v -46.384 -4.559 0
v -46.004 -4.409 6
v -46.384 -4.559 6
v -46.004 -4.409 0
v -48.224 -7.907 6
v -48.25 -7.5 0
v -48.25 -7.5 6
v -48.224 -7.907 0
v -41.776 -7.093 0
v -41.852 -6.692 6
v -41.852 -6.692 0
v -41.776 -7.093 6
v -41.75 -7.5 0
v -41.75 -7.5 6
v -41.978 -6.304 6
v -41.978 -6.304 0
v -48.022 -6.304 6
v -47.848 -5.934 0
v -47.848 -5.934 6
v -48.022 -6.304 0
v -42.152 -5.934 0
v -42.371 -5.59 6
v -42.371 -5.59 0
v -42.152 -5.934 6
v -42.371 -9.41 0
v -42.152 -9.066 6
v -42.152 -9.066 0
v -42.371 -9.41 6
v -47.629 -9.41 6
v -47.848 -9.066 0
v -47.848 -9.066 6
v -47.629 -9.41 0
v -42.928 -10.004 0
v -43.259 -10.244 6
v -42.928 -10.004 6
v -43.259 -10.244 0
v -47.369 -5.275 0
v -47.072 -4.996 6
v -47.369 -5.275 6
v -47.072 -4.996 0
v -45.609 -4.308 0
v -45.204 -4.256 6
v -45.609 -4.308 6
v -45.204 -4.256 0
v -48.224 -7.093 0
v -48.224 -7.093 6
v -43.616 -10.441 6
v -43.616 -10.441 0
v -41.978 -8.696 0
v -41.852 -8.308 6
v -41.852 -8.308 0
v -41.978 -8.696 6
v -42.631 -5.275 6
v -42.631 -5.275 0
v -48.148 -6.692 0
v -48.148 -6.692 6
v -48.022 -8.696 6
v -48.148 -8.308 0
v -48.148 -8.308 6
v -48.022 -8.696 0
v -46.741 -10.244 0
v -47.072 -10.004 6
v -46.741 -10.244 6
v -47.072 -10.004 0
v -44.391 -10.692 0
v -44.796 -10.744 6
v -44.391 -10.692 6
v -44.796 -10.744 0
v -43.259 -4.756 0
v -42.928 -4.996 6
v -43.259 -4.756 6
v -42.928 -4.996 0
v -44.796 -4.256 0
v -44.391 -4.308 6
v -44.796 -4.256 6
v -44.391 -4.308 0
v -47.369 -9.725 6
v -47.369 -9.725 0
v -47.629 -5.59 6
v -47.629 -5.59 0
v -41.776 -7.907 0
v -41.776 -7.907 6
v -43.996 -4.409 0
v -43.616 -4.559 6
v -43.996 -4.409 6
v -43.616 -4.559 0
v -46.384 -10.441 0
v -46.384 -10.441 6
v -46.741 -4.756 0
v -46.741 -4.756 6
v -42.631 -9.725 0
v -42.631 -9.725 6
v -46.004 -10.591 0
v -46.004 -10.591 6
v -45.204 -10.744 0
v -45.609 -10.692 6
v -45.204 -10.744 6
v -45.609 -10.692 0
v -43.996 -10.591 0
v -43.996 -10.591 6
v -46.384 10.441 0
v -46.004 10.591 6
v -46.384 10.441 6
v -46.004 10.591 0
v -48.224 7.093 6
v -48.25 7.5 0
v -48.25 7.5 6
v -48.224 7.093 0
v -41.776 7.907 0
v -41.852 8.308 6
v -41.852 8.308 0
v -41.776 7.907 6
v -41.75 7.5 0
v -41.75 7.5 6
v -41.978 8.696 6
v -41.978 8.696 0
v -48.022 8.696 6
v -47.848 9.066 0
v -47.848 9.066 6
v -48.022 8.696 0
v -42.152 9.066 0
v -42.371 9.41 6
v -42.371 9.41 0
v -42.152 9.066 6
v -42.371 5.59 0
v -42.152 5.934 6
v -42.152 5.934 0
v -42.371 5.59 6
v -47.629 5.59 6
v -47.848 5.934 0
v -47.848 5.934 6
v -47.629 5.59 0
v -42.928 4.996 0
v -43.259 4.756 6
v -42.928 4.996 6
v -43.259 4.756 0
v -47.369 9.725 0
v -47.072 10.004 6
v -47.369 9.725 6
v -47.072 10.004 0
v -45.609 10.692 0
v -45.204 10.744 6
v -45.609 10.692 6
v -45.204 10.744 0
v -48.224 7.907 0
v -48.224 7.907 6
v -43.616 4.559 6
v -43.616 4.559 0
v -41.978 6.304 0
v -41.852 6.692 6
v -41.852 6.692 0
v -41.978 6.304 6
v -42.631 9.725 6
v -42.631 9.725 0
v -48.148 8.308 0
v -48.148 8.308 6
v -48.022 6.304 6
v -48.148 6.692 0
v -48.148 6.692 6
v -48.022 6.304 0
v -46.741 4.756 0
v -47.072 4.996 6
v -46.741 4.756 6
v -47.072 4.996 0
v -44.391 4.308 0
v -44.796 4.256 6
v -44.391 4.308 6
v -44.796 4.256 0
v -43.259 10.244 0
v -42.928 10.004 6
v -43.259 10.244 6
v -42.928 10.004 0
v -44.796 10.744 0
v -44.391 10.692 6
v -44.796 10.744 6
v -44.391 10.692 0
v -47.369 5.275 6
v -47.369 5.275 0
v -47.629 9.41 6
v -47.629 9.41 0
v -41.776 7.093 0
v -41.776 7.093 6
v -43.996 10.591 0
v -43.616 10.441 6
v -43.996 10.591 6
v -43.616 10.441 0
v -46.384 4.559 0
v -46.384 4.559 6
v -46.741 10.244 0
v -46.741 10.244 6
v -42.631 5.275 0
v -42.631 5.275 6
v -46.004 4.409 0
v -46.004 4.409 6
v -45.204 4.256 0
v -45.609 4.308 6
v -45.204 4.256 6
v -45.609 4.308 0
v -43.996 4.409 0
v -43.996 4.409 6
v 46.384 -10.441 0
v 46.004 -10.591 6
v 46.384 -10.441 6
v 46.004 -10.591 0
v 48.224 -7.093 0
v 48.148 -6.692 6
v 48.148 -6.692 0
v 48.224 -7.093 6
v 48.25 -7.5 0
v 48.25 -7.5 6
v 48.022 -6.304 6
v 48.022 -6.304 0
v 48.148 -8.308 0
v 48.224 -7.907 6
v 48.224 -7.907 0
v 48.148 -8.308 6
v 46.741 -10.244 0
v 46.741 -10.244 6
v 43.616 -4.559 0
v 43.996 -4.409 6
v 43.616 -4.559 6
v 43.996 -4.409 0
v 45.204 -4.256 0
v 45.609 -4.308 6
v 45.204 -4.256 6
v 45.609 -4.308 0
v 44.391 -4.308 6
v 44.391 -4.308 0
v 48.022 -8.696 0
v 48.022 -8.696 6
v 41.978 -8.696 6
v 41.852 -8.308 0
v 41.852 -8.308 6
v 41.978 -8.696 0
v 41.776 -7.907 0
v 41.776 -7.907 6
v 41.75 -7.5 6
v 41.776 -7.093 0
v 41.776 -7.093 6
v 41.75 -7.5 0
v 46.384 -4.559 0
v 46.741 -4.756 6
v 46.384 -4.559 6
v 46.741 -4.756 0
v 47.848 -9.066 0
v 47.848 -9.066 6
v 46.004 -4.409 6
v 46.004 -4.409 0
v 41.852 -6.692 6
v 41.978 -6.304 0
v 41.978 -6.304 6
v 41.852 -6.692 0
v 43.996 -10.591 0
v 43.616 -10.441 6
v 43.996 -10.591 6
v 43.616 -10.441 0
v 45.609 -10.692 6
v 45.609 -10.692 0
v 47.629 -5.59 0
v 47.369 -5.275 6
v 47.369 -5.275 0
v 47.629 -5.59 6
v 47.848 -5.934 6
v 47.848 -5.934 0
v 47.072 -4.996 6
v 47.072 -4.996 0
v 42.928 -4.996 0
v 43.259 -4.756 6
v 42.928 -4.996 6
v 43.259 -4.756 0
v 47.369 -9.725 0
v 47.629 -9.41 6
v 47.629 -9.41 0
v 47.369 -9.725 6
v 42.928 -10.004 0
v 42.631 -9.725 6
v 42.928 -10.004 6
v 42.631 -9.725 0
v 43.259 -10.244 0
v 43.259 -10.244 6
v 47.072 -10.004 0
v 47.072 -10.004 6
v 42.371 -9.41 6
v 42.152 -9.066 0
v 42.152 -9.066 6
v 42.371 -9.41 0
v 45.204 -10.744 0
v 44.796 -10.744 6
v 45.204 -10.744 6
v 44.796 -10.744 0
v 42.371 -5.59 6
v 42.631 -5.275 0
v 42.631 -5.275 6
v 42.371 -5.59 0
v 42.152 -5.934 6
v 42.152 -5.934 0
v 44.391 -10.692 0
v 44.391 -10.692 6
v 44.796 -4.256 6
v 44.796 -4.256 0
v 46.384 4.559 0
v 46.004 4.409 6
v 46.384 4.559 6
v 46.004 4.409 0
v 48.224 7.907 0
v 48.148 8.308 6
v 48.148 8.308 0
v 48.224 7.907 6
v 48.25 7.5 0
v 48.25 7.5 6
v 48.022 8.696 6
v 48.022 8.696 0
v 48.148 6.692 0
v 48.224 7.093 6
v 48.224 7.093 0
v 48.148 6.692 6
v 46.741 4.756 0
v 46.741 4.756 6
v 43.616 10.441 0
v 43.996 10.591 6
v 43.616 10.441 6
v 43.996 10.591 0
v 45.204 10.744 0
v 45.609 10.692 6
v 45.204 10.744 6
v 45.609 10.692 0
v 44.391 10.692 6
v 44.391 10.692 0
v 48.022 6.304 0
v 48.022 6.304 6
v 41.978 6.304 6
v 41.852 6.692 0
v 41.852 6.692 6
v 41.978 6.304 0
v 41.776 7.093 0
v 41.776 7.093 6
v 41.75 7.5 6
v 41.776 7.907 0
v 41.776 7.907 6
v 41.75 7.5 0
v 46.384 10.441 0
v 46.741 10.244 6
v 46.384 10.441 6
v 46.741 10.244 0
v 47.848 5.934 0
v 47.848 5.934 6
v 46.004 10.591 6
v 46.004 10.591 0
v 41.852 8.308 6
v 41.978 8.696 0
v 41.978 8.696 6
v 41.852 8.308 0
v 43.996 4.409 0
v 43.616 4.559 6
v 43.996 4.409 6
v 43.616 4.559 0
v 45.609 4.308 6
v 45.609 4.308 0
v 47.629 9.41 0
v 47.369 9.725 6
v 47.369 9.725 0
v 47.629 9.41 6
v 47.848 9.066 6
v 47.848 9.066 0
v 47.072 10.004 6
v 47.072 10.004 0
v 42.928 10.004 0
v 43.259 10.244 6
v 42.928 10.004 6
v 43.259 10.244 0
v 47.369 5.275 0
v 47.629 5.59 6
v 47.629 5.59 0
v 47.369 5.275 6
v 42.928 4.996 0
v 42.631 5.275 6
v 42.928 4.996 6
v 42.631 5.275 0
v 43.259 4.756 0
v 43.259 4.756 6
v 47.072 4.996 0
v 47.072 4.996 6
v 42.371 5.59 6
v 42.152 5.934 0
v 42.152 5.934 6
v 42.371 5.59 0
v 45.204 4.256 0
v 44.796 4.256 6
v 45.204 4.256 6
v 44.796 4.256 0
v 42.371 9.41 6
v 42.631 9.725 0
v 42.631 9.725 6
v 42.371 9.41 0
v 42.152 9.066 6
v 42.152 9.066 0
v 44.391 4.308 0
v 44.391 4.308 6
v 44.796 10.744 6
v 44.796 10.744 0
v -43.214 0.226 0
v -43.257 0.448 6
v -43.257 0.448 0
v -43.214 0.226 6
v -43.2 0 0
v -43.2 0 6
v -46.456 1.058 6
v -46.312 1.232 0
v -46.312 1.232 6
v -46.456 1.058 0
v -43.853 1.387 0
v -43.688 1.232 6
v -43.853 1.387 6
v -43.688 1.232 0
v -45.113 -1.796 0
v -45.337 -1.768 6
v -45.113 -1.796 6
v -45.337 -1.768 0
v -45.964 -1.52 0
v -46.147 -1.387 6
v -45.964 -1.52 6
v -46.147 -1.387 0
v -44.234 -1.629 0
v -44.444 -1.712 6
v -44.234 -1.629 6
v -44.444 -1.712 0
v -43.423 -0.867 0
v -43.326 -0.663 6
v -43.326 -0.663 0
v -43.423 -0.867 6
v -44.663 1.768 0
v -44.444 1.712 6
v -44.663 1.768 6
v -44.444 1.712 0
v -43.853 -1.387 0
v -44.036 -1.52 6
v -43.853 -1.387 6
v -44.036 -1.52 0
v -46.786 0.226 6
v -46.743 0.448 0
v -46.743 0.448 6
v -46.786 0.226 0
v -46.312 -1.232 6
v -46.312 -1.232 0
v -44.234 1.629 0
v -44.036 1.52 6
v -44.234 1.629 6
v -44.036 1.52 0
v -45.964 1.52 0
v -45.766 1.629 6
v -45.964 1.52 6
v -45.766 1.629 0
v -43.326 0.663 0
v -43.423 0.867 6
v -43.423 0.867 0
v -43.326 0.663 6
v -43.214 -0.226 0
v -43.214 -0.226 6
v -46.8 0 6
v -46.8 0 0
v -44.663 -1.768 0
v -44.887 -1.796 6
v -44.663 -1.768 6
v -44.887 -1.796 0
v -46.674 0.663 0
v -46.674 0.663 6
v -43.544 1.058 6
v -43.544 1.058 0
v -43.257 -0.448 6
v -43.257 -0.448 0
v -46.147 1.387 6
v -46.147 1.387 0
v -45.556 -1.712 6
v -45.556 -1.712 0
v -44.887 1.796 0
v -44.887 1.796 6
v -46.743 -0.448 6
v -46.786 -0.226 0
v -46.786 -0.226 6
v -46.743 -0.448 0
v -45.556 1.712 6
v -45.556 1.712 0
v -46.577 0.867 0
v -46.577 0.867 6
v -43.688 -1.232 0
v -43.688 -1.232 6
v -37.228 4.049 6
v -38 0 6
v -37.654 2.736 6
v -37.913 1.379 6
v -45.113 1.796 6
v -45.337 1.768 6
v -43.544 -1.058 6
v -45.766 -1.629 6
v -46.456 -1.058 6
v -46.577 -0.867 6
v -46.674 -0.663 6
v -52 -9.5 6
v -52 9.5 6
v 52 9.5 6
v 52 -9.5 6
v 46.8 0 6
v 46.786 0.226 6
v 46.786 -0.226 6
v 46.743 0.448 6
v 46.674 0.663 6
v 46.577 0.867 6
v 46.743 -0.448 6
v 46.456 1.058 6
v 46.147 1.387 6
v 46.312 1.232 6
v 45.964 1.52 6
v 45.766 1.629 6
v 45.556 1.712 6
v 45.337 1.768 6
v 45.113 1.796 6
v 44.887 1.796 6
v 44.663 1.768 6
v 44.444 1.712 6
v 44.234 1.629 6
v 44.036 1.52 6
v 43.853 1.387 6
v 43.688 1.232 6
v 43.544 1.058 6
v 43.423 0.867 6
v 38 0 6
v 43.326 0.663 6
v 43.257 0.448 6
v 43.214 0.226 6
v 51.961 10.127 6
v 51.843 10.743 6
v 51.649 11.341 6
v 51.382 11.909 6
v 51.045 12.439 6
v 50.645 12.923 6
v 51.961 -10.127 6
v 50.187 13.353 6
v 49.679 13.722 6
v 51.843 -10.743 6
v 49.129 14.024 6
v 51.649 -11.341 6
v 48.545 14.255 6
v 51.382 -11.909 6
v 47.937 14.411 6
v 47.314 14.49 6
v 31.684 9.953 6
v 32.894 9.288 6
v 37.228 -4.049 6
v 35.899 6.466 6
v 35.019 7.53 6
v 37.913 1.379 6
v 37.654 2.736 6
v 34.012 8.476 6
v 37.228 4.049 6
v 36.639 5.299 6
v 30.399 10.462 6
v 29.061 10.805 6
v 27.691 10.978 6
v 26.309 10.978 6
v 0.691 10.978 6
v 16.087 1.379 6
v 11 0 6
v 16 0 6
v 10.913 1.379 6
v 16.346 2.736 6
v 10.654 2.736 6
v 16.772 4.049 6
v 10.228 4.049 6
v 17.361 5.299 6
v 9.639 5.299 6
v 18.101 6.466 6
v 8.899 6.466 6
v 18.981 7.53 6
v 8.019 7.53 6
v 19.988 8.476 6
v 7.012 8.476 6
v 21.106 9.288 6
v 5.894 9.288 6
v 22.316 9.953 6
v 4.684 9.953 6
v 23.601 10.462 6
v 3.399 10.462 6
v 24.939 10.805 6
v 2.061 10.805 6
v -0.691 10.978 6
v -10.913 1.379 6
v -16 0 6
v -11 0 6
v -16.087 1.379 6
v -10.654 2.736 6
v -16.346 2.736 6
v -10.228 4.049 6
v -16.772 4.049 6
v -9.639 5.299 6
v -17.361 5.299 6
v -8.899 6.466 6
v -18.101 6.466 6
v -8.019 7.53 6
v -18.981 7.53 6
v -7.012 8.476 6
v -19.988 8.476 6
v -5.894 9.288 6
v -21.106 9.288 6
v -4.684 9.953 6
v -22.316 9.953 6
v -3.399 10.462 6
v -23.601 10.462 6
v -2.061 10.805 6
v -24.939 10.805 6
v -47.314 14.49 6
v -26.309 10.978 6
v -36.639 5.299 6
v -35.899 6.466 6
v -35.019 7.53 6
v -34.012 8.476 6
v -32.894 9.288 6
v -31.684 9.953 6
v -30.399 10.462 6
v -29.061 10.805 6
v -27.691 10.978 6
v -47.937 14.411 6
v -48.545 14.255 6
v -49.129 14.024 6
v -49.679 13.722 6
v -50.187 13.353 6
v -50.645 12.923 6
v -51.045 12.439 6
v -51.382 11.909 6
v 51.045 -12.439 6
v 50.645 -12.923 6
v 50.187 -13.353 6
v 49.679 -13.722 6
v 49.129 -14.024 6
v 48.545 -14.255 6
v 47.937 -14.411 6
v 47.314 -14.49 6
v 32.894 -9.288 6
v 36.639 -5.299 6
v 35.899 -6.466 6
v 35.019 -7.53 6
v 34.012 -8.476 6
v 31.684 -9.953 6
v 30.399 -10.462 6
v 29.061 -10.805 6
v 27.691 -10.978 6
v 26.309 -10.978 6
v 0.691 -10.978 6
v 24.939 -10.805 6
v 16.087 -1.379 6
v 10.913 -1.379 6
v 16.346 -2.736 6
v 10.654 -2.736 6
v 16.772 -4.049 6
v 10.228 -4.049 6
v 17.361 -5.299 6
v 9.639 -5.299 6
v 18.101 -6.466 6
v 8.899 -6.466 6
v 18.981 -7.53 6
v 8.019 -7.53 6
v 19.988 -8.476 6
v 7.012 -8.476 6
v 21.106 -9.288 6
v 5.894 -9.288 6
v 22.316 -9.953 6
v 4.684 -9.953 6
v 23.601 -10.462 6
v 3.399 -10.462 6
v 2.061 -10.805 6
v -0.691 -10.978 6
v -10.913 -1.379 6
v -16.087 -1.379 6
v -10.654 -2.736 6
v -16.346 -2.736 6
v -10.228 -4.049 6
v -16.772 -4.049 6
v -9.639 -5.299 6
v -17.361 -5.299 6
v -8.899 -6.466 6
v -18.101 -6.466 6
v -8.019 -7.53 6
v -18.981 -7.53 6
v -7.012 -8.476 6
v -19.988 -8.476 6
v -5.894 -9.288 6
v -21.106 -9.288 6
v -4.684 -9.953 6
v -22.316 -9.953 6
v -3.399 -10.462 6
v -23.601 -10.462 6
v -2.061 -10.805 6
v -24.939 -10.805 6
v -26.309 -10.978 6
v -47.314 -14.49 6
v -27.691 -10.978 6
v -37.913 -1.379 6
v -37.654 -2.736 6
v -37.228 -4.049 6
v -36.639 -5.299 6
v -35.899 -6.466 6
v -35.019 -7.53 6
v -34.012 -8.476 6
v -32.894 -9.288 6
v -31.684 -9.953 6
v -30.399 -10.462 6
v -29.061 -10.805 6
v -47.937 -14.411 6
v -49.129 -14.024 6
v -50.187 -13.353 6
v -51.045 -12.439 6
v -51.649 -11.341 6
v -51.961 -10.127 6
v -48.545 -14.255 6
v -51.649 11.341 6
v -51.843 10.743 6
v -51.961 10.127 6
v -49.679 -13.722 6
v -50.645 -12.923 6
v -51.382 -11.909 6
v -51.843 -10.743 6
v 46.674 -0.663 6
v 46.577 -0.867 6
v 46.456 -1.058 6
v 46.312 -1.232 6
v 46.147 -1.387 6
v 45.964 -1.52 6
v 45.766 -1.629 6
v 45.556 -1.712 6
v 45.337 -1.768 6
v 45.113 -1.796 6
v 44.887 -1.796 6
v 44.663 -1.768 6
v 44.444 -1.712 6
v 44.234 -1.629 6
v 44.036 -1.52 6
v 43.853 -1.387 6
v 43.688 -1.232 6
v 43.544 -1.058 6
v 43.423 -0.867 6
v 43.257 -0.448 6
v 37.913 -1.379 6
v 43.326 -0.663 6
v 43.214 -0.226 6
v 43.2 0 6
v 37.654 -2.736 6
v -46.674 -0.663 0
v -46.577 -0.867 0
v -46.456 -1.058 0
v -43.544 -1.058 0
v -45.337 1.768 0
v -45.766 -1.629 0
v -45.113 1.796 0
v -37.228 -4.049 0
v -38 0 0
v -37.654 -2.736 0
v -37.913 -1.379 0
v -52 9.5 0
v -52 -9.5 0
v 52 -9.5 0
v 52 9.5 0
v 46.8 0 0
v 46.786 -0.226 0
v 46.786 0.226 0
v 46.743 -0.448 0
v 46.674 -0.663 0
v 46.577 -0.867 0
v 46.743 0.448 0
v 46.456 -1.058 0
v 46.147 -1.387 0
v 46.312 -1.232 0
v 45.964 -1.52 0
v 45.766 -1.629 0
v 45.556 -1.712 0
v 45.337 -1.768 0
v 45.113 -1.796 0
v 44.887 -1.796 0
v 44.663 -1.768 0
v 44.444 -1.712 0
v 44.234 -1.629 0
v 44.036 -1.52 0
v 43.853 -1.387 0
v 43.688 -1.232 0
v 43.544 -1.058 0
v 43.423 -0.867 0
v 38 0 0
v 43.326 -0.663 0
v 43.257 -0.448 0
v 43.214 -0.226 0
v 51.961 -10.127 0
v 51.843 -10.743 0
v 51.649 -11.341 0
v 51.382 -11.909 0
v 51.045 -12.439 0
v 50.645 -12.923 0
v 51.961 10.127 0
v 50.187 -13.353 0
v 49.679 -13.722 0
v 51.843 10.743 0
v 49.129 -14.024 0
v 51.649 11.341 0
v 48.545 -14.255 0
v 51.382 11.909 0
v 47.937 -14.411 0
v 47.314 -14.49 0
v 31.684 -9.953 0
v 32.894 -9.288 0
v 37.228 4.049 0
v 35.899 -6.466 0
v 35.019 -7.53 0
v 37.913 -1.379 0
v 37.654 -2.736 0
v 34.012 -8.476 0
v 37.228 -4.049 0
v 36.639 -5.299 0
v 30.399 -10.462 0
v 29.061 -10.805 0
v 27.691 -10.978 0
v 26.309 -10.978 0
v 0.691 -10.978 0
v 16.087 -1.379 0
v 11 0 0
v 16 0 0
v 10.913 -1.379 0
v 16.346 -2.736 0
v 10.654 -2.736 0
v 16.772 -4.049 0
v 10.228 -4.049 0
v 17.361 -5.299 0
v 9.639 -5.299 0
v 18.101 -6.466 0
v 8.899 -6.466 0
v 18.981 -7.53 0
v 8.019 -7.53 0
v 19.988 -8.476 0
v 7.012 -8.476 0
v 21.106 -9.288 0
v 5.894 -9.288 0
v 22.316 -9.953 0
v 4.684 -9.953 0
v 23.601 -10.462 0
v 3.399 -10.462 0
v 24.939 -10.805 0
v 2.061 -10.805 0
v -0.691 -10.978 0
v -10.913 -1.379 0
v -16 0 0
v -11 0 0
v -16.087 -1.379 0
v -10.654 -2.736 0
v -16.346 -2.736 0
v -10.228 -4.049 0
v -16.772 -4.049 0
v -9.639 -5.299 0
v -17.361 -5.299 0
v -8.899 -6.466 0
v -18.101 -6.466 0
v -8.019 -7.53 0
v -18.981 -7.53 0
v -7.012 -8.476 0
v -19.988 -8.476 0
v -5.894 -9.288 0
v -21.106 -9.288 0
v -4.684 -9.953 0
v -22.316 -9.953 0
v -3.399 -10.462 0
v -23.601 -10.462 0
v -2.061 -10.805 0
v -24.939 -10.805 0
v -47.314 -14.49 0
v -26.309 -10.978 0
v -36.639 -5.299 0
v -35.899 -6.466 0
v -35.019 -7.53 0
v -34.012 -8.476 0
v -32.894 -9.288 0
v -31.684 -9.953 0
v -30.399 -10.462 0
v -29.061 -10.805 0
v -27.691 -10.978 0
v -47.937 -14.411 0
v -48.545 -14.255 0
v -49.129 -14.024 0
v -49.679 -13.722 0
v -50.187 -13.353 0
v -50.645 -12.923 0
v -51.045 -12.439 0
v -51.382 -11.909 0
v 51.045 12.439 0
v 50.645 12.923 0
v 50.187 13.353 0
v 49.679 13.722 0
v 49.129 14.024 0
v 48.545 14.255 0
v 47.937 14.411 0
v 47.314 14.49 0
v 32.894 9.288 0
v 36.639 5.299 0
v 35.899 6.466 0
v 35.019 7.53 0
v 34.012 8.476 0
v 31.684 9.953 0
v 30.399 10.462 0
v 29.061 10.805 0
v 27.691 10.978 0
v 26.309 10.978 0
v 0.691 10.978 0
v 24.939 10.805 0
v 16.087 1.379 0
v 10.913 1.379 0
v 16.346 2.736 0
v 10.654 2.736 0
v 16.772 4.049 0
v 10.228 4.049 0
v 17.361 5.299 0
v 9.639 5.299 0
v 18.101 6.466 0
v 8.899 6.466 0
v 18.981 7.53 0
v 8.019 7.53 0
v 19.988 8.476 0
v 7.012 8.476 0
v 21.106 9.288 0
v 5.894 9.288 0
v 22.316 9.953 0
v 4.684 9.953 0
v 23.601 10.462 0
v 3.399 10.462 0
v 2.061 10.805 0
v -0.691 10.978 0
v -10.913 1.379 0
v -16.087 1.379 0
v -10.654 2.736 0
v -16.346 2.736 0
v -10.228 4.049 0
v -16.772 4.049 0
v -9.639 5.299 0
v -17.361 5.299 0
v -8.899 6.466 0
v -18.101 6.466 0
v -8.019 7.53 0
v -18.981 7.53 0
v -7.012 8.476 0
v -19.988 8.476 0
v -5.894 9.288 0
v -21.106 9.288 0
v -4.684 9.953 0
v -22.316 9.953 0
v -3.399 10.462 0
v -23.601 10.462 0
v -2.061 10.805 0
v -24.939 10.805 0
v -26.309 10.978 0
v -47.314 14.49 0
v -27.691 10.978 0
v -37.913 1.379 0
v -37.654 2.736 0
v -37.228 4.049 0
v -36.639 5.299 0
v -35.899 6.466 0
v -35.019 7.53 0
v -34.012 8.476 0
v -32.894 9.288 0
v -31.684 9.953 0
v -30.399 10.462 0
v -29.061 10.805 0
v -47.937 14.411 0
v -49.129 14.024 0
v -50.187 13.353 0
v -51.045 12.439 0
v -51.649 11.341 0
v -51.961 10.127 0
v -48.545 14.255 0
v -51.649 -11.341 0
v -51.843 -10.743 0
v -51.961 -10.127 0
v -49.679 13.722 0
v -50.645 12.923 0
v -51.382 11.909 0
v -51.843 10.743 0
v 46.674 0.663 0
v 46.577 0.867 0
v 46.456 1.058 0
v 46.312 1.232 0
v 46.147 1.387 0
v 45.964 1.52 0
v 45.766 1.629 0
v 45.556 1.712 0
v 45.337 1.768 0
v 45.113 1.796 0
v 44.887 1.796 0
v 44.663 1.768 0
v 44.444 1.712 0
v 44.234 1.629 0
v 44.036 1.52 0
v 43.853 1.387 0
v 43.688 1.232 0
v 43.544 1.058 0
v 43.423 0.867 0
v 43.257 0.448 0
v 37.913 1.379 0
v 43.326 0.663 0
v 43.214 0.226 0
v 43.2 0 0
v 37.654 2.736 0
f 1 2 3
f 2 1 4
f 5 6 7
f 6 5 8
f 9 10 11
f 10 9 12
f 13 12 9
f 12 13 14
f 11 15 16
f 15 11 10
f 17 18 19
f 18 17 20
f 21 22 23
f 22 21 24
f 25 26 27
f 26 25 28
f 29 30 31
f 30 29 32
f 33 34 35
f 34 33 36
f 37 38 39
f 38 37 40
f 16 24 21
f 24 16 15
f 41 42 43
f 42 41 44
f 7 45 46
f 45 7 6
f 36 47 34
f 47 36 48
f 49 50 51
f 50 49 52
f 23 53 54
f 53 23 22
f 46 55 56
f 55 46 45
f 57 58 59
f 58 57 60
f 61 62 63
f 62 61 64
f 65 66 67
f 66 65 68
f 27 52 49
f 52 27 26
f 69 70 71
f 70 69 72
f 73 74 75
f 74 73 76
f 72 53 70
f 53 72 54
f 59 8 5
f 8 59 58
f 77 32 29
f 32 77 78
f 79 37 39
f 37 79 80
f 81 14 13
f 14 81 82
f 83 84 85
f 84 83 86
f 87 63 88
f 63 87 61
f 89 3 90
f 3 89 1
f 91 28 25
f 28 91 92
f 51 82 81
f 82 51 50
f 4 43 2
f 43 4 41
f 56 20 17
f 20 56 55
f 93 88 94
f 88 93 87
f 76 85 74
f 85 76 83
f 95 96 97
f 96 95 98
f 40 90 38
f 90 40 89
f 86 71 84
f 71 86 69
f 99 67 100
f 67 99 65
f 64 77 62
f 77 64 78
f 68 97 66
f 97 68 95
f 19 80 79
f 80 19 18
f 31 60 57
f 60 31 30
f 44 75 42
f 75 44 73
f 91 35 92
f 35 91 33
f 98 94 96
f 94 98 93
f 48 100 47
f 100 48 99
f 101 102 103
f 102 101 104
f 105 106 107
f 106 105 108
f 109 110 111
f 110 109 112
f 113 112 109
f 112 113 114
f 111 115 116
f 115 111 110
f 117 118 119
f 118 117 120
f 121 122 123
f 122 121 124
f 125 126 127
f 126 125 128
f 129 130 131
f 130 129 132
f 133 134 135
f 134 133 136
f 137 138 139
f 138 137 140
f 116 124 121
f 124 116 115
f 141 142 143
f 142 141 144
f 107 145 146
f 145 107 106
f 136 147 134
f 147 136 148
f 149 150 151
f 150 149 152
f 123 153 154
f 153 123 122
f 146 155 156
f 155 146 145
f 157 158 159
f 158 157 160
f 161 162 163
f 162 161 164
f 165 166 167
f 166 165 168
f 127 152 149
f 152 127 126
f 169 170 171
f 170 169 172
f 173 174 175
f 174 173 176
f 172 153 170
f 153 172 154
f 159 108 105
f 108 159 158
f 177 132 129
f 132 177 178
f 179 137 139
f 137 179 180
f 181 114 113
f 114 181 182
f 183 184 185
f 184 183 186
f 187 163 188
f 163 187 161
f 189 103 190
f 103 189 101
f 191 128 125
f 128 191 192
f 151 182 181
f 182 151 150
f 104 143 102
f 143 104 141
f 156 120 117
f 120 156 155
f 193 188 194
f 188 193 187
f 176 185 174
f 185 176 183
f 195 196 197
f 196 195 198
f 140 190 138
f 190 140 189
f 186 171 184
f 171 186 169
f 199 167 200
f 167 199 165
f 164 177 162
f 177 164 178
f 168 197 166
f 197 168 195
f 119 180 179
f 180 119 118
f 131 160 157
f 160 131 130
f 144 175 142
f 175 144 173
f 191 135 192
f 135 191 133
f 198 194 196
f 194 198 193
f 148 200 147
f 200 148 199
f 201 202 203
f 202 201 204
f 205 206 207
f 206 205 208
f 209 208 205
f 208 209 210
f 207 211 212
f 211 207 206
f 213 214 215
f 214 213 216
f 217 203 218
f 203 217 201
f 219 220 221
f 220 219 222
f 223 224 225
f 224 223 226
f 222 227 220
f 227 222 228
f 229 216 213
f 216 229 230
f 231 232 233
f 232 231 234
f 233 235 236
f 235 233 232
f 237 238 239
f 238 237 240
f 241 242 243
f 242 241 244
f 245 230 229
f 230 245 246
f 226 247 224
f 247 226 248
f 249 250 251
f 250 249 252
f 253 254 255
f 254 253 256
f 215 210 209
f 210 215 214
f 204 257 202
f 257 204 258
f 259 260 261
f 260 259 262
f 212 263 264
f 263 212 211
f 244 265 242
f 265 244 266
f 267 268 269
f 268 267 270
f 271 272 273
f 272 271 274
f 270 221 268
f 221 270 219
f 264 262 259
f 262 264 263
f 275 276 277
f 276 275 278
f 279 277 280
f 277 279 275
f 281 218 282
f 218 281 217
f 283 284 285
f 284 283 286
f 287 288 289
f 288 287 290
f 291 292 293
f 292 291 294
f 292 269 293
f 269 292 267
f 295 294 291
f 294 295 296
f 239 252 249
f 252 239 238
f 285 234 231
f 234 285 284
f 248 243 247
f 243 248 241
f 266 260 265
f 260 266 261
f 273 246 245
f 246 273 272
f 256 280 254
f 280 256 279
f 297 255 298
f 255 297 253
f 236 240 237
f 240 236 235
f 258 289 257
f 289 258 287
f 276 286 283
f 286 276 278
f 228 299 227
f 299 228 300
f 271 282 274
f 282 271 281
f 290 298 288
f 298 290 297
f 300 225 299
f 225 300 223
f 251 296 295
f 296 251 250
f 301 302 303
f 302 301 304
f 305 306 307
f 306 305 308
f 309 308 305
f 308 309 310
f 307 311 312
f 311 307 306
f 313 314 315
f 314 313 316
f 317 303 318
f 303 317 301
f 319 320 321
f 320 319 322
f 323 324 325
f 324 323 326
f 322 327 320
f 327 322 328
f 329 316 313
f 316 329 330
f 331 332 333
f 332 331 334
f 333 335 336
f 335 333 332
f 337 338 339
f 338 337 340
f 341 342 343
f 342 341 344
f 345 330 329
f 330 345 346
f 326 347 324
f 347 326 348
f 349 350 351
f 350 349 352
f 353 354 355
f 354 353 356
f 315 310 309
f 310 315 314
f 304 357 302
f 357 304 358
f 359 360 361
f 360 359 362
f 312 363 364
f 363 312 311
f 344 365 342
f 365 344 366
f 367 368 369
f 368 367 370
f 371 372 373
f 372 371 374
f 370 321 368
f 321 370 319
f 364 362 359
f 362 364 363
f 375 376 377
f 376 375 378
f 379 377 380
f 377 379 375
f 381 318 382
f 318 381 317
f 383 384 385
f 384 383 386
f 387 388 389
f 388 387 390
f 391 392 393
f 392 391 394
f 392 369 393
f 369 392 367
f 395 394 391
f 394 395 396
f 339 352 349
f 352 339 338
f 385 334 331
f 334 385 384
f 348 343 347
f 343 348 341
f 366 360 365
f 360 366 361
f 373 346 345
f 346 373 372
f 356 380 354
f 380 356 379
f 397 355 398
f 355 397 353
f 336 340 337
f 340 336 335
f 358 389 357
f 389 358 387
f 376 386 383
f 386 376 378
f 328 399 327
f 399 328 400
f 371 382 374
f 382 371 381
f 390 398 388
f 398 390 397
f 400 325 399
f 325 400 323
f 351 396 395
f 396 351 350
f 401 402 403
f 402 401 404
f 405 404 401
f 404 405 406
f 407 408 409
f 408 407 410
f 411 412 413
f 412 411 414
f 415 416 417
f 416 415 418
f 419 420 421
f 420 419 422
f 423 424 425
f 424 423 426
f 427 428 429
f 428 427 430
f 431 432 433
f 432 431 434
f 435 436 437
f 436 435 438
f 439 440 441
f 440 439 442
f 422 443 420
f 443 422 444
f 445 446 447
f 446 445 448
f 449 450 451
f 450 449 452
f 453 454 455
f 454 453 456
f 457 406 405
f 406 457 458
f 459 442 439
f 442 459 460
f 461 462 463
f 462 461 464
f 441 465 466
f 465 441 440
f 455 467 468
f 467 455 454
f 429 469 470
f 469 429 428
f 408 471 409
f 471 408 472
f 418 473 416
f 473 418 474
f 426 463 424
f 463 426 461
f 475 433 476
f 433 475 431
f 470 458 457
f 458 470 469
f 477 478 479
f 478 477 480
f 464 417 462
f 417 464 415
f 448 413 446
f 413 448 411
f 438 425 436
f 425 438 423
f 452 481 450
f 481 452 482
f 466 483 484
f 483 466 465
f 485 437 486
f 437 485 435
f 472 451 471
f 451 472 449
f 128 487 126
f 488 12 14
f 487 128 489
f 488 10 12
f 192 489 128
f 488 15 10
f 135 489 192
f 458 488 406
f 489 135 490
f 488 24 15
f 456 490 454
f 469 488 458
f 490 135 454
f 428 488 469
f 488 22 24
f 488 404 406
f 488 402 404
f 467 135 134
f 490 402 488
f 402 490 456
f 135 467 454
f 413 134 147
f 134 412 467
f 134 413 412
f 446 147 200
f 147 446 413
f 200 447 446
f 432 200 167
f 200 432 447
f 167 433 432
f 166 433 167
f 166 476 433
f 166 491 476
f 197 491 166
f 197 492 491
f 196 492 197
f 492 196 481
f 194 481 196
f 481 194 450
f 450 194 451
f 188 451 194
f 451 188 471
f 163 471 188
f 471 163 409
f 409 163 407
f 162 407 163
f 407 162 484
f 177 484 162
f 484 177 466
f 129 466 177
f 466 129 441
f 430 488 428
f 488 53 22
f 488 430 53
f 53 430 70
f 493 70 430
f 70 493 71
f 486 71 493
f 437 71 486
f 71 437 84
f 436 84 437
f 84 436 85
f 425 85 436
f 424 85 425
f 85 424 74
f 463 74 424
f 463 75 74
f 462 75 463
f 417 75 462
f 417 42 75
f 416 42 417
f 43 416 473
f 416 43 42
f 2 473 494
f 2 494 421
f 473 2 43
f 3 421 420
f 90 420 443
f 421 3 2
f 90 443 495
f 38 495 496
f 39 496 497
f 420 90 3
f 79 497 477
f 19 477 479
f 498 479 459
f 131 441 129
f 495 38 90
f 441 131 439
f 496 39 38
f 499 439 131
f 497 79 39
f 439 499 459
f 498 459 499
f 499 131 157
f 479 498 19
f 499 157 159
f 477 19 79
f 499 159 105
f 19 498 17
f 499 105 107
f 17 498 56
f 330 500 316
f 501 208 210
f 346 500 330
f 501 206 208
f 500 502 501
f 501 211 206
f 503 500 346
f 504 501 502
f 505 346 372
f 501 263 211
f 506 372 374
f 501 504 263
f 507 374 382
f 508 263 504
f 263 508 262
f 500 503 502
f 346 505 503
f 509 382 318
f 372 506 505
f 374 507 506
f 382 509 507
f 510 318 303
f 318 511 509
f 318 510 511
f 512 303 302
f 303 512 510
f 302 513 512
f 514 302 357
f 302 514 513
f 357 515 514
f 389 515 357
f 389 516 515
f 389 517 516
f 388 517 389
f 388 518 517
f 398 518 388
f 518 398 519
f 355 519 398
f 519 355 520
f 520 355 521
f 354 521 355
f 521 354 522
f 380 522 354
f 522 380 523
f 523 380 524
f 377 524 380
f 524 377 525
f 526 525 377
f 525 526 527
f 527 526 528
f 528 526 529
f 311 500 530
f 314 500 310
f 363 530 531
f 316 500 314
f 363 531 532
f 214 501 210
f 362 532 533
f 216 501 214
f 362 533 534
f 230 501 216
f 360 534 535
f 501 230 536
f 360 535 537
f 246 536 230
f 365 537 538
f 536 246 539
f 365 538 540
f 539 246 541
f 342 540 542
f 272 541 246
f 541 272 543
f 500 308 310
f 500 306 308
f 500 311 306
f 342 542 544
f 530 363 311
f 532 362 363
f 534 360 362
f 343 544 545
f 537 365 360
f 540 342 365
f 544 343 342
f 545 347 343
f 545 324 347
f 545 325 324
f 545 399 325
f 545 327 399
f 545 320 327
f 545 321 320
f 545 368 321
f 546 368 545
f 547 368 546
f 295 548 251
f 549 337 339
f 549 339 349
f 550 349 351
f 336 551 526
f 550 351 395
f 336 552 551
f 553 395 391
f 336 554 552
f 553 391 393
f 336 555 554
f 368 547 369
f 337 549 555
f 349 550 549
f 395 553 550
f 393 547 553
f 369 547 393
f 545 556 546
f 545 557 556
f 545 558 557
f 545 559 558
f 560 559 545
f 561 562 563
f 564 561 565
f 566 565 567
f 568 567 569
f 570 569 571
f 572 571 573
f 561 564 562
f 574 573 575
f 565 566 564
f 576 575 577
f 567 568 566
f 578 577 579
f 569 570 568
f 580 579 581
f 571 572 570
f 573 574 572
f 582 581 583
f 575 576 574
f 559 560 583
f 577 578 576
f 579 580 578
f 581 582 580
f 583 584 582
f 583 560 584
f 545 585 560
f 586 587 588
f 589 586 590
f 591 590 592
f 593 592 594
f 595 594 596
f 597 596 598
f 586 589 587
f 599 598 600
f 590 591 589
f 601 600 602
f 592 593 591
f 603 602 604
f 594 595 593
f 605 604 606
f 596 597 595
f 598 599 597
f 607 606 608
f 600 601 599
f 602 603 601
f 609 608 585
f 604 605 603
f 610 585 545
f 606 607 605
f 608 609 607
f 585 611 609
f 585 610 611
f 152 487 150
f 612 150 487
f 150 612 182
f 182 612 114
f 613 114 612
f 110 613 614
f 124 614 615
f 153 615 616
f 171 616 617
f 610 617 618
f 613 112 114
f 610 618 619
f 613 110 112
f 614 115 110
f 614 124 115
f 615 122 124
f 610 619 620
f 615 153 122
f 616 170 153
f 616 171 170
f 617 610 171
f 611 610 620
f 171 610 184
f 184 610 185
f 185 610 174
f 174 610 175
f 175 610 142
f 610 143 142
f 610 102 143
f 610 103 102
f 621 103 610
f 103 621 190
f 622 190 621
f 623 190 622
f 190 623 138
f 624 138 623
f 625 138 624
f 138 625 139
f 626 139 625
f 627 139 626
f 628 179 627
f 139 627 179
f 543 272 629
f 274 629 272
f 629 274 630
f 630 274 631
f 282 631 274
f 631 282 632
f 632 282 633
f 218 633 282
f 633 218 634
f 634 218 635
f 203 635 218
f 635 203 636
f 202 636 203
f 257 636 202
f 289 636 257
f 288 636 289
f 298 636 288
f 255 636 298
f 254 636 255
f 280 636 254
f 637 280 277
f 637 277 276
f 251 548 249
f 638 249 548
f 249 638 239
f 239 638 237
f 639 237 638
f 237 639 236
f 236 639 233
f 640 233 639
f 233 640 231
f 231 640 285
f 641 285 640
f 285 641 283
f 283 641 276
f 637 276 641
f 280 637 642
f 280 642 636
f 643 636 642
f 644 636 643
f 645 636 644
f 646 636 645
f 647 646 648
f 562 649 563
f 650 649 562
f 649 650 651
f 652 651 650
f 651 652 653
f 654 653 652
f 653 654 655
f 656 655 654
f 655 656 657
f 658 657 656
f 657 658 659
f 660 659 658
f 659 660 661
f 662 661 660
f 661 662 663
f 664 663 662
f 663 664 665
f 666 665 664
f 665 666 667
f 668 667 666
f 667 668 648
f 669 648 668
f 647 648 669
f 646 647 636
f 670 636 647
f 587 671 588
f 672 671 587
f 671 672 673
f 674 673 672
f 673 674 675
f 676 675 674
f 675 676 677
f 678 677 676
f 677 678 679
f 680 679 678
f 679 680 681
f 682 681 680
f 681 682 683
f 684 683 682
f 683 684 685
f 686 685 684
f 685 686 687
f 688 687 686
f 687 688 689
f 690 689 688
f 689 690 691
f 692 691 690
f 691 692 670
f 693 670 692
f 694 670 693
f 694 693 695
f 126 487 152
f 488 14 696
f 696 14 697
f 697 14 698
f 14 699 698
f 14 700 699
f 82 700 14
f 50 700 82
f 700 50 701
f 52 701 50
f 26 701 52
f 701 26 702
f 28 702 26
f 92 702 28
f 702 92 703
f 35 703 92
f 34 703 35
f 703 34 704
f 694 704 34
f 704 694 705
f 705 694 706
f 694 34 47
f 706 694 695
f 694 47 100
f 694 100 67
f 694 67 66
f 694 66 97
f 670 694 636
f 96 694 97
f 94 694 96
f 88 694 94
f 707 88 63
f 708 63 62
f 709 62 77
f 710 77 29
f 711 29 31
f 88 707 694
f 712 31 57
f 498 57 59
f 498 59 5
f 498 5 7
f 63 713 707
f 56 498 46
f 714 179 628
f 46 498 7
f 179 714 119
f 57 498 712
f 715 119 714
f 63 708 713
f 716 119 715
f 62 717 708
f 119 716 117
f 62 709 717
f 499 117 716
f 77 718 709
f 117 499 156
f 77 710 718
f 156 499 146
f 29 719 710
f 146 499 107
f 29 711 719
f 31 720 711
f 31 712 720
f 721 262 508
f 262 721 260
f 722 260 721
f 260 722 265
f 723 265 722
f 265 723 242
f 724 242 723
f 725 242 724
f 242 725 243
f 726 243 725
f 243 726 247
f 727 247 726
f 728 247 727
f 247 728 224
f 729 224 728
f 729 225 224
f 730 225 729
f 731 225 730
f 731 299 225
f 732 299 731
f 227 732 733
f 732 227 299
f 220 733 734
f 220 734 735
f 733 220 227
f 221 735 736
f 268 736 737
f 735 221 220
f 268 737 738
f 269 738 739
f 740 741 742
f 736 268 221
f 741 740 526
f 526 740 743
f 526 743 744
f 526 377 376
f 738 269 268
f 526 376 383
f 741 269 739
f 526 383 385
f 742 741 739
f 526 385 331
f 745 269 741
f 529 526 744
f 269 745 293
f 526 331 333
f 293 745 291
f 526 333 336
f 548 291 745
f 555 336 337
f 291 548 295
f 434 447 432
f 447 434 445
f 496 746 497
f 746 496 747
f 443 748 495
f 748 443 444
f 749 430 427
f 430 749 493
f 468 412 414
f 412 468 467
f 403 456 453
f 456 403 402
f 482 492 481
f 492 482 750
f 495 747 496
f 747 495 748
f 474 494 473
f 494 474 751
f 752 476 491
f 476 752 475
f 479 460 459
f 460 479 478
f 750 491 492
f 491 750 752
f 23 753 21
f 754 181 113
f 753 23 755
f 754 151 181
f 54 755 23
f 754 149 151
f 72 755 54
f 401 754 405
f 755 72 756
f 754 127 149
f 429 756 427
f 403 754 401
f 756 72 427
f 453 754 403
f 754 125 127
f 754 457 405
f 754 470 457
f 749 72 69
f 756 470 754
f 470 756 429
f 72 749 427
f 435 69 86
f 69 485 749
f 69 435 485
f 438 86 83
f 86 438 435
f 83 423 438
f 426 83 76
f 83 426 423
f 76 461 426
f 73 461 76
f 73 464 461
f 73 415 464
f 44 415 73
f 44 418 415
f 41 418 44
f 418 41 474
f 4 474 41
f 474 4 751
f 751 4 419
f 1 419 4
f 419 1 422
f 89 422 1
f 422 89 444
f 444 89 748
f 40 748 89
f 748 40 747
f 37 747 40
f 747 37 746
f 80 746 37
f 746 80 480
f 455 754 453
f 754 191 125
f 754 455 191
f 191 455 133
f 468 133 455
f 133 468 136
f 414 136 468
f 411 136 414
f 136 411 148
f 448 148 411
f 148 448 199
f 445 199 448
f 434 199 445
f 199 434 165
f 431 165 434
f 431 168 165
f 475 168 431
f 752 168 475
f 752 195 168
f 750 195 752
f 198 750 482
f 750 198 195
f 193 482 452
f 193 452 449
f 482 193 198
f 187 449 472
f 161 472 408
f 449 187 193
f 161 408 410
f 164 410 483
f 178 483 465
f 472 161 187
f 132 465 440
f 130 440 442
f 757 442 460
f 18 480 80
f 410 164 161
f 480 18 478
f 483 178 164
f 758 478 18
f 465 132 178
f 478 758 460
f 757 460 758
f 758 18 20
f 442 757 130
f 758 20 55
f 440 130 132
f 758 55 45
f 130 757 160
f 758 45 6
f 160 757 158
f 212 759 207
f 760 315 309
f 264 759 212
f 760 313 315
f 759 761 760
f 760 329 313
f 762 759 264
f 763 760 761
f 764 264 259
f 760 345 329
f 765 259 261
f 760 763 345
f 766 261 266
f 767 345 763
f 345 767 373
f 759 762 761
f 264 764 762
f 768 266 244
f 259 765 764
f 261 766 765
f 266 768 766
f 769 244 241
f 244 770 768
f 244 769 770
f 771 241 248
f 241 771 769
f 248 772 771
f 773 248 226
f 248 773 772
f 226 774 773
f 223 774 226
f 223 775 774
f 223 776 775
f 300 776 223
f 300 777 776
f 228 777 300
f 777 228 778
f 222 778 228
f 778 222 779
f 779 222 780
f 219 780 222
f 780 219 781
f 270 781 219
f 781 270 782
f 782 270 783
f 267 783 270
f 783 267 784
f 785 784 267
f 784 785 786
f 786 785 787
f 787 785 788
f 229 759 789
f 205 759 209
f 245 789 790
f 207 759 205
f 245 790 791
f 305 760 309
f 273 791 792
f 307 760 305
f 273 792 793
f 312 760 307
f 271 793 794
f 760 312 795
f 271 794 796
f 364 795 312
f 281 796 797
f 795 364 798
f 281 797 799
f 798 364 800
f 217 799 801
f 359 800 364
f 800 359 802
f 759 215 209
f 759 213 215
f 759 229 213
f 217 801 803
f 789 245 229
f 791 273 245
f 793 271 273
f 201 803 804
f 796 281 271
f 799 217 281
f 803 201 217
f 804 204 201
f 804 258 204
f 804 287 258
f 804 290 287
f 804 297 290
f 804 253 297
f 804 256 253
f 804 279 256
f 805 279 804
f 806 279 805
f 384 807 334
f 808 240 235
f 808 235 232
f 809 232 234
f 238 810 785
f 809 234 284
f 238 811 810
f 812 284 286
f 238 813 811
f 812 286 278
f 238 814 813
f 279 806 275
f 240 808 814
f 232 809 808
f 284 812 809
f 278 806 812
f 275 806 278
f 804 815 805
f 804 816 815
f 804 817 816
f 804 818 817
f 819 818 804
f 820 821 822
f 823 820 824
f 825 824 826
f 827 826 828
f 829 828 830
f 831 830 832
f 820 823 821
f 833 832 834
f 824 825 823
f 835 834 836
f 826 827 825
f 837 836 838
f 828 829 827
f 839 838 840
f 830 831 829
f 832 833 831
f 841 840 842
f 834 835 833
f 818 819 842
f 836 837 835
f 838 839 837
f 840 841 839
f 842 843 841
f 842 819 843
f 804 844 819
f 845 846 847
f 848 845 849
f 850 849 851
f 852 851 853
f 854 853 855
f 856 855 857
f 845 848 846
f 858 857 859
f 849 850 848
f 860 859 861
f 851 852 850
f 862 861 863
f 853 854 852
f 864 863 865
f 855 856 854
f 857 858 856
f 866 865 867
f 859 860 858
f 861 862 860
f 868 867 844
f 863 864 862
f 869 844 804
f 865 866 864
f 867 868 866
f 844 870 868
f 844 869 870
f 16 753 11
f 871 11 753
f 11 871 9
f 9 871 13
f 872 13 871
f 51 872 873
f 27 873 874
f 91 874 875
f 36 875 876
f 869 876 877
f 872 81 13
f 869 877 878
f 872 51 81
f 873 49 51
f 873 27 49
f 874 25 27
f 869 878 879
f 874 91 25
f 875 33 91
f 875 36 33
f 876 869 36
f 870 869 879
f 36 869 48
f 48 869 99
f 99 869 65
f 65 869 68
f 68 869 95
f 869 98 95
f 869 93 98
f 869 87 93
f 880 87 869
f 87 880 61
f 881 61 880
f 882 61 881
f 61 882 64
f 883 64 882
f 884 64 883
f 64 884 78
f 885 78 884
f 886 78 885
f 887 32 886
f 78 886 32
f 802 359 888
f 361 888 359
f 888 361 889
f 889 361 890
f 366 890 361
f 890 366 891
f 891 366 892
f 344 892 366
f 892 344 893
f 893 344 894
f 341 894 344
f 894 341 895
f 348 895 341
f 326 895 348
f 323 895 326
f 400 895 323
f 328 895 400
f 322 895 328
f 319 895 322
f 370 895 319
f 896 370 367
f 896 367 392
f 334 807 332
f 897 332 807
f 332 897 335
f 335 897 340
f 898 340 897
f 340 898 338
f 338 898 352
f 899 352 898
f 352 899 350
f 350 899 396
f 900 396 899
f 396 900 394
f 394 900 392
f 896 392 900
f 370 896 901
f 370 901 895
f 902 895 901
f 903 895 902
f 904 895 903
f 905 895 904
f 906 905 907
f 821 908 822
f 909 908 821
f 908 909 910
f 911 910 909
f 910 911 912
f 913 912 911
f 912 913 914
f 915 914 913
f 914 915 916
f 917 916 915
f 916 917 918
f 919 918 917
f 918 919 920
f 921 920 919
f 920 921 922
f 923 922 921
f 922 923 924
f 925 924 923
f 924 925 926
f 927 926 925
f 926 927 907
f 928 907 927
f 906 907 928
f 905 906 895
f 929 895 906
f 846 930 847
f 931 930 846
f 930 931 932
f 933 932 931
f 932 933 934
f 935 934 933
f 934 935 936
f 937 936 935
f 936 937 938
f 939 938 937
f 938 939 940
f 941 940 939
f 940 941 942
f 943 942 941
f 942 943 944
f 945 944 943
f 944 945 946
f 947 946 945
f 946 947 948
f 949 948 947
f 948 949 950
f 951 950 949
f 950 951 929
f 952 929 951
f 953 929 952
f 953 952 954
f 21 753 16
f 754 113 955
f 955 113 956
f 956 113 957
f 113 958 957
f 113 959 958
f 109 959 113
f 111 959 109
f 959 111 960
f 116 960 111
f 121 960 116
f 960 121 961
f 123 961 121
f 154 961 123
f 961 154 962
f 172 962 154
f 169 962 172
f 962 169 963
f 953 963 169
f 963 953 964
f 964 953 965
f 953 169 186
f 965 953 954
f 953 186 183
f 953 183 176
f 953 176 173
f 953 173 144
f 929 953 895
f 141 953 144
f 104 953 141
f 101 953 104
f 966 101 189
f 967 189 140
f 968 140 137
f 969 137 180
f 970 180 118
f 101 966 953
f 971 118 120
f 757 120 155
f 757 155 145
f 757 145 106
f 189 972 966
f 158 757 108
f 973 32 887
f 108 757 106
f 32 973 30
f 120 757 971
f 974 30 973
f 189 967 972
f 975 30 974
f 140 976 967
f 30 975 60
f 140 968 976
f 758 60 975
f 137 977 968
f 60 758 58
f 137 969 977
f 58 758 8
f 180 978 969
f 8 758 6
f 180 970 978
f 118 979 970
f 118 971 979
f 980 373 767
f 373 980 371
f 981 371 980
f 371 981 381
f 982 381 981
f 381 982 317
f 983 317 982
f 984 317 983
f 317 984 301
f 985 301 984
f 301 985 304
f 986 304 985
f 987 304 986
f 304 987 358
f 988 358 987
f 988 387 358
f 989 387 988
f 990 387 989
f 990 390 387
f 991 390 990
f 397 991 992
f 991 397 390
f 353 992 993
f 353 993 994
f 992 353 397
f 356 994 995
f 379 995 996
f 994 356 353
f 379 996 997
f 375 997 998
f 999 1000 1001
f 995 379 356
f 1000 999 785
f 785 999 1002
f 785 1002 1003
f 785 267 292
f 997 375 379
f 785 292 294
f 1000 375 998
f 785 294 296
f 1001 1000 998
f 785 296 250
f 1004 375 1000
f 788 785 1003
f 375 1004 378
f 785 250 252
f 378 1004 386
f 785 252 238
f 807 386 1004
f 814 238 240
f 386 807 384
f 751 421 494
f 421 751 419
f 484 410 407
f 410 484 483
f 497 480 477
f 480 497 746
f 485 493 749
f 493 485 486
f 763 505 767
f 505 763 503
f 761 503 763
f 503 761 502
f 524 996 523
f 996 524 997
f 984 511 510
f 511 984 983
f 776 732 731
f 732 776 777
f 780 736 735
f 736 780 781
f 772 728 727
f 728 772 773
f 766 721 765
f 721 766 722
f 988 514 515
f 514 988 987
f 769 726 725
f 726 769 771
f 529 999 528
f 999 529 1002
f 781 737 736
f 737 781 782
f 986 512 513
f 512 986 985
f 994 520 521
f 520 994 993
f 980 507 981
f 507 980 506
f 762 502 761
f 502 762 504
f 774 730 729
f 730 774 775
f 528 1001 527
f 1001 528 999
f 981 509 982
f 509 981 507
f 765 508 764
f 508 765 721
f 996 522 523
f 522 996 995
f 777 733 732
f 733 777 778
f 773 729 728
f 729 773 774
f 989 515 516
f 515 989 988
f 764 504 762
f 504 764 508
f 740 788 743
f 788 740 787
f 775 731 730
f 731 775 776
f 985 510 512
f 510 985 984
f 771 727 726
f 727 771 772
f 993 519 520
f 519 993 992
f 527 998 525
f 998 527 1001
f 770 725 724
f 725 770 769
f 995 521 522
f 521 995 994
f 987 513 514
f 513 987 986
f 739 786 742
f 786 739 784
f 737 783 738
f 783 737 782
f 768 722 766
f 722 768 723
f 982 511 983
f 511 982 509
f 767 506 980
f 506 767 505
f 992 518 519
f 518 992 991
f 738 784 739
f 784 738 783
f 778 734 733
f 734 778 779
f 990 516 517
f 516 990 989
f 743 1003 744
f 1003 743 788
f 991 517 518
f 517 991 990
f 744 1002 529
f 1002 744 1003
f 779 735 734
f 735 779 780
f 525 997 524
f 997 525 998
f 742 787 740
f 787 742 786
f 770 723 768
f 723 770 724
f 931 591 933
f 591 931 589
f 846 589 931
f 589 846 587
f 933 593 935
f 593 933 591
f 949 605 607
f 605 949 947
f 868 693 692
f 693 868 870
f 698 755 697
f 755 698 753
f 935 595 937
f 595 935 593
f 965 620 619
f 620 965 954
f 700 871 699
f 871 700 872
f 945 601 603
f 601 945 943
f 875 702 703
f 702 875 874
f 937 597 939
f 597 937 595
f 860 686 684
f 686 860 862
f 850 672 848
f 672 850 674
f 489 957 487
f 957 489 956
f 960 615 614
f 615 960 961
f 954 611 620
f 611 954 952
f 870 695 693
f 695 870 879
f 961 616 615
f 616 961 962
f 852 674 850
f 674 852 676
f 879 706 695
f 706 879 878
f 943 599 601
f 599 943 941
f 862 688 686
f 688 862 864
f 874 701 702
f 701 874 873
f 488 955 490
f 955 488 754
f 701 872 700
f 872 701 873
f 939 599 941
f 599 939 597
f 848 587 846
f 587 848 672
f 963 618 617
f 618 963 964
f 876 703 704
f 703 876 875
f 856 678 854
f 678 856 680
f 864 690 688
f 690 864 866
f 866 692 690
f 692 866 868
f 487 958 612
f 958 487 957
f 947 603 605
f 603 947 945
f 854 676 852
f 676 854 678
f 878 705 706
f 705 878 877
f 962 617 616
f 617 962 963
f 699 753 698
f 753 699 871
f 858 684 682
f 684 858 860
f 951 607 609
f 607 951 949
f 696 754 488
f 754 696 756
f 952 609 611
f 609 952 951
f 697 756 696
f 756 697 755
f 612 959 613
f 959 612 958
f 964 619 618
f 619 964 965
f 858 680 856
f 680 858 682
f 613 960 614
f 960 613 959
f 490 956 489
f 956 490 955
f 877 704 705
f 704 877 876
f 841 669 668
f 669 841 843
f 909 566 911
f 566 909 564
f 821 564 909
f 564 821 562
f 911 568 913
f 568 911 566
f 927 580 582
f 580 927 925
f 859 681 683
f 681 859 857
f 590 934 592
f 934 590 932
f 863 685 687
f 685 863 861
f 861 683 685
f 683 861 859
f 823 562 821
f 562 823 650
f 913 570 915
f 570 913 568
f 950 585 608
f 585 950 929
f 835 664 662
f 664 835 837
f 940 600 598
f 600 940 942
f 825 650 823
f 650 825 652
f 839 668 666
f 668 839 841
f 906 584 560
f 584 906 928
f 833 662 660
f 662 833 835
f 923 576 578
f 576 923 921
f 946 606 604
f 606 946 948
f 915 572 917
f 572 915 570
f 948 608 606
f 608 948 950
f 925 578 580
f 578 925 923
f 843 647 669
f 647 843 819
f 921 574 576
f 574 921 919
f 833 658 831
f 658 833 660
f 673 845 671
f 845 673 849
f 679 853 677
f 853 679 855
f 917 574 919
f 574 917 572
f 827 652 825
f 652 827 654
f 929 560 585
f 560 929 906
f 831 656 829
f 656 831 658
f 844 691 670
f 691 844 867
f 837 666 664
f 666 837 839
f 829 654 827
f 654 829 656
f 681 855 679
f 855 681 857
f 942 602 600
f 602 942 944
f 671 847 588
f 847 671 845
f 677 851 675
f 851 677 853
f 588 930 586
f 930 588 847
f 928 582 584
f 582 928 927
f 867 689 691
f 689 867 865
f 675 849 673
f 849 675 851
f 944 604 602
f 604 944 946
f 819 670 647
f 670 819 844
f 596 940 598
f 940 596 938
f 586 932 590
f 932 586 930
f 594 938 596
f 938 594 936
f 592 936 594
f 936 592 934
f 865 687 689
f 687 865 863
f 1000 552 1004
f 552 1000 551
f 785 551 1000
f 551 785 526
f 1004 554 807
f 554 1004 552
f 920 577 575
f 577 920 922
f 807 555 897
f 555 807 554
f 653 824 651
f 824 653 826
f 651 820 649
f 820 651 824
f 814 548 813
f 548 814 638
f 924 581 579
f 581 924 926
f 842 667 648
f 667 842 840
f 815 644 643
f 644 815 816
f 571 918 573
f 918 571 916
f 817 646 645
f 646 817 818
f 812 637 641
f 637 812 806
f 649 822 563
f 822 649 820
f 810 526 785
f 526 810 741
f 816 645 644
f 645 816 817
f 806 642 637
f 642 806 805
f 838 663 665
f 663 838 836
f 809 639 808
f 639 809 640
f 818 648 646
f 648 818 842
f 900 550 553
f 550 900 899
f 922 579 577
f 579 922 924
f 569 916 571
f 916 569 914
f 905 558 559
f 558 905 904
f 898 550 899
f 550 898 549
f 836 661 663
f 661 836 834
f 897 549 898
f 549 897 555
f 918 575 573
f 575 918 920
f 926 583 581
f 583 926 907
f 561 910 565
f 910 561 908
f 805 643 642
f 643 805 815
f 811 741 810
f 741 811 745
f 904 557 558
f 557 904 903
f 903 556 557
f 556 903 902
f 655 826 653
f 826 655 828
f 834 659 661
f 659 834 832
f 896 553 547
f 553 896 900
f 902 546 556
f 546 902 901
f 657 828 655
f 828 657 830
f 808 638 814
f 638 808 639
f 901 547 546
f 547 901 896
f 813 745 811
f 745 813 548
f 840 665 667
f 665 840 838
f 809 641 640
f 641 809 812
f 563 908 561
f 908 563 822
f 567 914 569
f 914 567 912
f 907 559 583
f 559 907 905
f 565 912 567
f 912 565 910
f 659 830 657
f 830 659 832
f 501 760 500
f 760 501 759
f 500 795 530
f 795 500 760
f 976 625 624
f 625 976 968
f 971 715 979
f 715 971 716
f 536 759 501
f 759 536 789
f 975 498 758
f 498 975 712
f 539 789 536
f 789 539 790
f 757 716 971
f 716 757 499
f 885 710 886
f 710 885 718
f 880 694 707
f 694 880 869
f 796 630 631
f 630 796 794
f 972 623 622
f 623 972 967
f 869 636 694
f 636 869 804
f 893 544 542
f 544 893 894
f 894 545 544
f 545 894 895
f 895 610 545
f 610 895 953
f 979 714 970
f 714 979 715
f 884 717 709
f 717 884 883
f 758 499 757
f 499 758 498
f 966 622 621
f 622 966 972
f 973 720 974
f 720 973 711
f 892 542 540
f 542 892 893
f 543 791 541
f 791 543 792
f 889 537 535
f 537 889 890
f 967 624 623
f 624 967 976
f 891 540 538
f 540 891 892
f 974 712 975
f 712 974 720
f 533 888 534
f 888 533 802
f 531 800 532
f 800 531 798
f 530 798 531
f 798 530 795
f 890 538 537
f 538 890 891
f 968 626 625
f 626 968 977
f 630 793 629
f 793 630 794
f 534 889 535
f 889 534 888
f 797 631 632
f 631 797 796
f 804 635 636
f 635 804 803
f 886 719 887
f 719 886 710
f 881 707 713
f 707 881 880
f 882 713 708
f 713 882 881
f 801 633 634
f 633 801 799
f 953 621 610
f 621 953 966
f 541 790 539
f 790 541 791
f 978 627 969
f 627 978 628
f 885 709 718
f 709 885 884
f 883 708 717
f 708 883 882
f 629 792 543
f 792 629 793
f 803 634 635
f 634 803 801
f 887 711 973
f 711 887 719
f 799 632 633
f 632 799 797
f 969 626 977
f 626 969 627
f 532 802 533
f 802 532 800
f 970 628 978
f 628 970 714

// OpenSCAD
$fn = 50;


difference() {
	union() {
		hull() {
			translate(v = [-47.0000000000, 9.5000000000, 0]) {
				cylinder(h = 6, r = 5);
			}
			translate(v = [47.0000000000, 9.5000000000, 0]) {
				cylinder(h = 6, r = 5);
			}
			translate(v = [-47.0000000000, -9.5000000000, 0]) {
				cylinder(h = 6, r = 5);
			}
			translate(v = [47.0000000000, -9.5000000000, 0]) {
				cylinder(h = 6, r = 5);
			}
		}
	}
	union() {
		#translate(v = [-45.0000000000, -7.5000000000, 0]) {
			cylinder(h = 6, r = 3.2500000000);
		}
		#translate(v = [-45.0000000000, 7.5000000000, 0]) {
			cylinder(h = 6, r = 3.2500000000);
		}
		#translate(v = [45.0000000000, -7.5000000000, 0]) {
			cylinder(h = 6, r = 3.2500000000);
		}
		#translate(v = [45.0000000000, 7.5000000000, 0]) {
			cylinder(h = 6, r = 3.2500000000);
		}
		#translate(v = [-45.0000000000, -7.5000000000, -100.0000000000]) {
			cylinder(h = 200, r = 3.2500000000);
		}
		#translate(v = [-45.0000000000, 7.5000000000, -100.0000000000]) {
			cylinder(h = 200, r = 3.2500000000);
		}
		#translate(v = [45.0000000000, -7.5000000000, -100.0000000000]) {
			cylinder(h = 200, r = 3.2500000000);
		}
		#translate(v = [45.0000000000, 7.5000000000, -100.0000000000]) {
			cylinder(h = 200, r = 3.2500000000);
		}
		#translate(v = [-45.0000000000, -7.5000000000, 0]) {
			cylinder(h = 6, r = 1.8000000000);
		}
		#translate(v = [-45.0000000000, 0.0000000000, 0]) {
			cylinder(h = 6, r = 1.8000000000);
		}
		#translate(v = [-45.0000000000, 7.5000000000, 0]) {
			cylinder(h = 6, r = 1.8000000000);
		}
		#translate(v = [45.0000000000, -7.5000000000, 0]) {
			cylinder(h = 6, r = 1.8000000000);
		}
		#translate(v = [45.0000000000, 0.0000000000, 0]) {
			cylinder(h = 6, r = 1.8000000000);
		}
		#translate(v = [45.0000000000, 7.5000000000, 0]) {
			cylinder(h = 6, r = 1.8000000000);
		}
		#translate(v = [-45.0000000000, -7.5000000000, 0]) {
			cylinder(h = 6, r = 1.8000000000);
		}
		#translate(v = [-45.0000000000, 0.0000000000, 0]) {
			cylinder(h = 6, r = 1.8000000000);
		}
		#translate(v = [-45.0000000000, 7.5000000000, 0]) {
			cylinder(h = 6, r = 1.8000000000);
		}
		#translate(v = [45.0000000000, -7.5000000000, 0]) {
			cylinder(h = 6, r = 1.8000000000);
		}
		#translate(v = [45.0000000000, 0.0000000000, 0]) {
			cylinder(h = 6, r = 1.8000000000);
		}
		#translate(v = [45.0000000000, 7.5000000000, 0]) {
			cylinder(h = 6, r = 1.8000000000);
		}
		#translate(v = [-45.0000000000, -7.5000000000, 0]) {
			cylinder(h = 6, r = 1.8000000000);
		}
		#translate(v = [-45.0000000000, 0.0000000000, 0]) {
			cylinder(h = 6, r = 1.8000000000);
		}
		#translate(v = [-45.0000000000, 7.5000000000, 0]) {
			cylinder(h = 6, r = 1.8000000000);
		}
		#translate(v = [45.0000000000, -7.5000000000, 0]) {
			cylinder(h = 6, r = 1.8000000000);
		}
		#translate(v = [45.0000000000, 0.0000000000, 0]) {
			cylinder(h = 6, r = 1.8000000000);
		}
		#translate(v = [45.0000000000, 7.5000000000, 0]) {
			cylinder(h = 6, r = 1.8000000000);
		}
		#translate(v = [-27.0000000000, 0, 0]) {
			cylinder(h = 6, r = 11.0000000000);
		}
		#cylinder(h = 6, r = 11.0000000000);
		#translate(v = [27.0000000000, 0, 0]) {
			cylinder(h = 6, r = 11.0000000000);
		}
	}
}
